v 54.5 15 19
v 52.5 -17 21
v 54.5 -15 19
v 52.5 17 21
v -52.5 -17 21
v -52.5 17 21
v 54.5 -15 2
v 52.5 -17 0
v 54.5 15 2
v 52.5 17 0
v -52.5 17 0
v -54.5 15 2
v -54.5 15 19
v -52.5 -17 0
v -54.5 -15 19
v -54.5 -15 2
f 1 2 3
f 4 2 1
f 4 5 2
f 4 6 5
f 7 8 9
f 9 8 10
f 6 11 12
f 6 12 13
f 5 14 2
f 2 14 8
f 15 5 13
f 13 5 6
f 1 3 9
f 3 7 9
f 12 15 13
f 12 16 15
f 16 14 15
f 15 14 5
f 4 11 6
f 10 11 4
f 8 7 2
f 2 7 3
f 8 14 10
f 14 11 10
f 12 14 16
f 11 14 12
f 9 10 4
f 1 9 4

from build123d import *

# Parameters (mm, degrees)
SKETCH1_W           = 109
SKETCH1_H           = 34
BOSS_EXTRUDE1_DEPTH = 21
CHAMFER1_SIZE       = 2


with BuildPart() as part:
    # Sketch1 → Boss-Extrude1 (new body)
    with BuildSketch(Plane.XY):
        Rectangle(SKETCH1_W, SKETCH1_H)
    extrude(amount=BOSS_EXTRUDE1_DEPTH)

    # Chamfer1
    chamfer1_edges = [part.edges().sort_by_distance(p)[0] for p in [
        (-54.5, 0, 21),
        (54.5, 0, 21),
        (-54.5, 0, 0),
        (54.5, 0, 0),
        (54.5, -17, 10.5),
        (-54.5, -17, 10.5),
        (-54.5, 17, 10.5),
        (54.5, 17, 10.5),
    ]]
    chamfer(chamfer1_edges, length=CHAMFER1_SIZE)


solid = part.part
